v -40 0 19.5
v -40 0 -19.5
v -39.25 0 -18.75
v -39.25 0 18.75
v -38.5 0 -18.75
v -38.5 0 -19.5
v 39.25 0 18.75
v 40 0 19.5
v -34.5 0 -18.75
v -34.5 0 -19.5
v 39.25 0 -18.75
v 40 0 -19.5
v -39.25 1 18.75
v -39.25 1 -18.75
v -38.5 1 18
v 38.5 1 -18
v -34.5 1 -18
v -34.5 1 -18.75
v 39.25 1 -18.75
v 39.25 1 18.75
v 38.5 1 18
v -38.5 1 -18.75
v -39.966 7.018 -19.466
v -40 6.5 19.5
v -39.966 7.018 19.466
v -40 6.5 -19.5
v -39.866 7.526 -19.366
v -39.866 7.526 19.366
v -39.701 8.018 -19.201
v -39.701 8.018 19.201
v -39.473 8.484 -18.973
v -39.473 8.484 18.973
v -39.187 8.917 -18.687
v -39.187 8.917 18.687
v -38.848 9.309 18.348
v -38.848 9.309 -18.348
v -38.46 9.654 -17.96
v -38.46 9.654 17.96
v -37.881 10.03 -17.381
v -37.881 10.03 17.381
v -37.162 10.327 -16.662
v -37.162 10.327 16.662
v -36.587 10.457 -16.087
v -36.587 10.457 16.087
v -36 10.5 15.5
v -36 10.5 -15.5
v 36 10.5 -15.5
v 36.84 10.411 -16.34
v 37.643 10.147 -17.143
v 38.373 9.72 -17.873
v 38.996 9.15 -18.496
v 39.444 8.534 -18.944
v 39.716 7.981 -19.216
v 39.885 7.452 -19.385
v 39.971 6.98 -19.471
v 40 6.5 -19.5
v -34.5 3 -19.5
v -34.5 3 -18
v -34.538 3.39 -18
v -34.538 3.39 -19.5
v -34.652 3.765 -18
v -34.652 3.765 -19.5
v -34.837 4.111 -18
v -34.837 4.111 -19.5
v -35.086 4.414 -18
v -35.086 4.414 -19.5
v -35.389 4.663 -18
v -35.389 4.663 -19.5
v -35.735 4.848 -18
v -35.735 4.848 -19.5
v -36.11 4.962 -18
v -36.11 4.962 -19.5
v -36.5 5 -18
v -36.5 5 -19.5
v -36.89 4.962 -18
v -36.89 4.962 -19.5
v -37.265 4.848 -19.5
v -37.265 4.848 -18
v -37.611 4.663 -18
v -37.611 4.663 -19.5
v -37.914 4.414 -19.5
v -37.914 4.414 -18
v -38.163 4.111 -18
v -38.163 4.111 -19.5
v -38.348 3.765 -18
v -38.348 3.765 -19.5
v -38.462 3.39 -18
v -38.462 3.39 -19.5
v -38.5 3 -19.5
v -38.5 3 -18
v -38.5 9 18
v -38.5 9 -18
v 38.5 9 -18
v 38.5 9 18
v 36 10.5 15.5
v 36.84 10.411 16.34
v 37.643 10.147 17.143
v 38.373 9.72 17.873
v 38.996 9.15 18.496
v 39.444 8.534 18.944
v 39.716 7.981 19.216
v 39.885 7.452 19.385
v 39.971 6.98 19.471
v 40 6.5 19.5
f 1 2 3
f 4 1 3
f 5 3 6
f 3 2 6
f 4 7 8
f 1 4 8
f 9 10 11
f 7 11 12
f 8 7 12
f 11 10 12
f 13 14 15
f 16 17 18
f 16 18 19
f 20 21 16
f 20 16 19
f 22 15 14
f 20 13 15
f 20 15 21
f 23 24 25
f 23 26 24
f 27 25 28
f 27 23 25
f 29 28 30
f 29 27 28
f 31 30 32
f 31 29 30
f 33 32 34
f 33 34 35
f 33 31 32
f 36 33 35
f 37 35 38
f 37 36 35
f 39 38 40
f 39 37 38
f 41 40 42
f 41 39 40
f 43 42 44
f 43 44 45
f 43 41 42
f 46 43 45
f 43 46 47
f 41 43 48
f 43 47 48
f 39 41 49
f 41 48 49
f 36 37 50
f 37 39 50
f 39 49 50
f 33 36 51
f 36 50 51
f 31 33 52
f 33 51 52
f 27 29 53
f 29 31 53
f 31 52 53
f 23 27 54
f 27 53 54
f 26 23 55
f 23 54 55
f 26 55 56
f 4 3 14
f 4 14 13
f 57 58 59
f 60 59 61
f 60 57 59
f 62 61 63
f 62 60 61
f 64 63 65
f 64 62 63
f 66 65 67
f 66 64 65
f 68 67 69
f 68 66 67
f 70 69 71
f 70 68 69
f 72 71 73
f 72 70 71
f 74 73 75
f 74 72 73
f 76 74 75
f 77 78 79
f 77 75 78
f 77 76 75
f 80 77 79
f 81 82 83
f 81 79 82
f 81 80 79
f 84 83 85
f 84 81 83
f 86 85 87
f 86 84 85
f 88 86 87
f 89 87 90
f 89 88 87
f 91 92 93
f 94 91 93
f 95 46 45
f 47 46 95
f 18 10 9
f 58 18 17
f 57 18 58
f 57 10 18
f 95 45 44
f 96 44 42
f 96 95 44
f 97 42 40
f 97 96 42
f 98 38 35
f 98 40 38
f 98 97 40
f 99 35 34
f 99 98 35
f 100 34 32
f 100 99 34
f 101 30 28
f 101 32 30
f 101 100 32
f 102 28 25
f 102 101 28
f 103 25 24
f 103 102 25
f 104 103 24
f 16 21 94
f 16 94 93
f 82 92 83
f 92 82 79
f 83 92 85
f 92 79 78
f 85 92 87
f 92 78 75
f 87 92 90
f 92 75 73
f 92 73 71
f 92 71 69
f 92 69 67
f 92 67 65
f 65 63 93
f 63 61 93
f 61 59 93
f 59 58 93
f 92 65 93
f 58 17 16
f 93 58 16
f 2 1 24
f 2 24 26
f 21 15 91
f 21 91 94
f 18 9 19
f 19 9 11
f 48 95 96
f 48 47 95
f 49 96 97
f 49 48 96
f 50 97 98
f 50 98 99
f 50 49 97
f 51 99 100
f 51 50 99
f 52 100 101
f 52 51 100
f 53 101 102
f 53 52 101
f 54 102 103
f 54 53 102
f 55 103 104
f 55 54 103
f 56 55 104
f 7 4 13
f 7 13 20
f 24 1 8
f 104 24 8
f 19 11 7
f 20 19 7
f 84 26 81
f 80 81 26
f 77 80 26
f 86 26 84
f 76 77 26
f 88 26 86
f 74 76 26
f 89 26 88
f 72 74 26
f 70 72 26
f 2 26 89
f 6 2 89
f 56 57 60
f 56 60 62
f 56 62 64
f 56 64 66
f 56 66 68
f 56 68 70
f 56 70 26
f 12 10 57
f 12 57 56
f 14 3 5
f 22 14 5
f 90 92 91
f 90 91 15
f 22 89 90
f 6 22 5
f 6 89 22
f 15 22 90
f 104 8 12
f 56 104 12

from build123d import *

# Parameters (mm, degrees)
SKETCH1_W           = 80
SKETCH1_H           = 39
SKETCH1_W_2         = 77
SKETCH1_H_2         = 36
BOSS_EXTRUDE1_DEPTH = 9
SKETCH2_W           = 80
SKETCH2_H           = 39
BOSS_EXTRUDE2_DEPTH = 1.5
SKETCH4_W           = 78.5
SKETCH4_H           = 37.5
CUT_EXTRUDE1_DEPTH  = 1
FILLET1_R           = 4
CUT_EXTRUDE2_REACH  = 58.844


with BuildPart() as part:
    # Sketch1 → Boss-Extrude1 (new body)
    with BuildSketch(Plane(origin=(0, 0, 0), x_dir=(1, 0, 0), z_dir=(0, 1, 0))):
        Rectangle(SKETCH1_W, SKETCH1_H)
        Rectangle(SKETCH1_W_2, SKETCH1_H_2, mode=Mode.SUBTRACT)
    extrude(amount=BOSS_EXTRUDE1_DEPTH)

    # Sketch2 → Boss-Extrude2 (add)
    with BuildSketch(Plane(origin=(0, 9, 0), x_dir=(1, 0, 0), z_dir=(0, 1, 0))):
        Rectangle(SKETCH2_W, SKETCH2_H)
    extrude(amount=BOSS_EXTRUDE2_DEPTH)

    # Sketch4 → Cut-Extrude1 (cut)
    with BuildSketch(Plane.XZ):
        Rectangle(SKETCH4_W, SKETCH4_H)
    extrude(amount=-CUT_EXTRUDE1_DEPTH, mode=Mode.SUBTRACT)

    # Fillet1
    fillet1_edges = [part.edges().sort_by_distance(p)[0] for p in [
        (-40, 10.5, 0),
        (0, 10.5, 19.5),
        (40, 10.5, 0),
        (0, 10.5, -19.5),
    ]]
    fillet(fillet1_edges, radius=FILLET1_R)

    # Sketch5 → Cut-Extrude2 (cut, up to next)
    with BuildSketch(Plane(origin=(0, 0, -19.5), x_dir=(-1, 0, 0), z_dir=(0, 0, -1)), mode=Mode.PRIVATE) as cut_extrude2_sk1:
        with BuildLine():
            Line((34.5, -3), (34.5, 3))
            ThreePointArc((34.5, 3), (36.5, 5), (38.5, 3))
            Line((38.5, 3), (38.5, -3))
            ThreePointArc((38.5, -3), (36.5, -5), (34.5, -3))
        make_face()
    cut_extrude2_tool1 = extrude(cut_extrude2_sk1.sketch, amount=-CUT_EXTRUDE2_REACH, mode=Mode.PRIVATE) & part.part
    add(cut_extrude2_tool1.solids().sort_by_distance((-36.5, 0, -19.5))[0], mode=Mode.SUBTRACT)


solid = part.part
